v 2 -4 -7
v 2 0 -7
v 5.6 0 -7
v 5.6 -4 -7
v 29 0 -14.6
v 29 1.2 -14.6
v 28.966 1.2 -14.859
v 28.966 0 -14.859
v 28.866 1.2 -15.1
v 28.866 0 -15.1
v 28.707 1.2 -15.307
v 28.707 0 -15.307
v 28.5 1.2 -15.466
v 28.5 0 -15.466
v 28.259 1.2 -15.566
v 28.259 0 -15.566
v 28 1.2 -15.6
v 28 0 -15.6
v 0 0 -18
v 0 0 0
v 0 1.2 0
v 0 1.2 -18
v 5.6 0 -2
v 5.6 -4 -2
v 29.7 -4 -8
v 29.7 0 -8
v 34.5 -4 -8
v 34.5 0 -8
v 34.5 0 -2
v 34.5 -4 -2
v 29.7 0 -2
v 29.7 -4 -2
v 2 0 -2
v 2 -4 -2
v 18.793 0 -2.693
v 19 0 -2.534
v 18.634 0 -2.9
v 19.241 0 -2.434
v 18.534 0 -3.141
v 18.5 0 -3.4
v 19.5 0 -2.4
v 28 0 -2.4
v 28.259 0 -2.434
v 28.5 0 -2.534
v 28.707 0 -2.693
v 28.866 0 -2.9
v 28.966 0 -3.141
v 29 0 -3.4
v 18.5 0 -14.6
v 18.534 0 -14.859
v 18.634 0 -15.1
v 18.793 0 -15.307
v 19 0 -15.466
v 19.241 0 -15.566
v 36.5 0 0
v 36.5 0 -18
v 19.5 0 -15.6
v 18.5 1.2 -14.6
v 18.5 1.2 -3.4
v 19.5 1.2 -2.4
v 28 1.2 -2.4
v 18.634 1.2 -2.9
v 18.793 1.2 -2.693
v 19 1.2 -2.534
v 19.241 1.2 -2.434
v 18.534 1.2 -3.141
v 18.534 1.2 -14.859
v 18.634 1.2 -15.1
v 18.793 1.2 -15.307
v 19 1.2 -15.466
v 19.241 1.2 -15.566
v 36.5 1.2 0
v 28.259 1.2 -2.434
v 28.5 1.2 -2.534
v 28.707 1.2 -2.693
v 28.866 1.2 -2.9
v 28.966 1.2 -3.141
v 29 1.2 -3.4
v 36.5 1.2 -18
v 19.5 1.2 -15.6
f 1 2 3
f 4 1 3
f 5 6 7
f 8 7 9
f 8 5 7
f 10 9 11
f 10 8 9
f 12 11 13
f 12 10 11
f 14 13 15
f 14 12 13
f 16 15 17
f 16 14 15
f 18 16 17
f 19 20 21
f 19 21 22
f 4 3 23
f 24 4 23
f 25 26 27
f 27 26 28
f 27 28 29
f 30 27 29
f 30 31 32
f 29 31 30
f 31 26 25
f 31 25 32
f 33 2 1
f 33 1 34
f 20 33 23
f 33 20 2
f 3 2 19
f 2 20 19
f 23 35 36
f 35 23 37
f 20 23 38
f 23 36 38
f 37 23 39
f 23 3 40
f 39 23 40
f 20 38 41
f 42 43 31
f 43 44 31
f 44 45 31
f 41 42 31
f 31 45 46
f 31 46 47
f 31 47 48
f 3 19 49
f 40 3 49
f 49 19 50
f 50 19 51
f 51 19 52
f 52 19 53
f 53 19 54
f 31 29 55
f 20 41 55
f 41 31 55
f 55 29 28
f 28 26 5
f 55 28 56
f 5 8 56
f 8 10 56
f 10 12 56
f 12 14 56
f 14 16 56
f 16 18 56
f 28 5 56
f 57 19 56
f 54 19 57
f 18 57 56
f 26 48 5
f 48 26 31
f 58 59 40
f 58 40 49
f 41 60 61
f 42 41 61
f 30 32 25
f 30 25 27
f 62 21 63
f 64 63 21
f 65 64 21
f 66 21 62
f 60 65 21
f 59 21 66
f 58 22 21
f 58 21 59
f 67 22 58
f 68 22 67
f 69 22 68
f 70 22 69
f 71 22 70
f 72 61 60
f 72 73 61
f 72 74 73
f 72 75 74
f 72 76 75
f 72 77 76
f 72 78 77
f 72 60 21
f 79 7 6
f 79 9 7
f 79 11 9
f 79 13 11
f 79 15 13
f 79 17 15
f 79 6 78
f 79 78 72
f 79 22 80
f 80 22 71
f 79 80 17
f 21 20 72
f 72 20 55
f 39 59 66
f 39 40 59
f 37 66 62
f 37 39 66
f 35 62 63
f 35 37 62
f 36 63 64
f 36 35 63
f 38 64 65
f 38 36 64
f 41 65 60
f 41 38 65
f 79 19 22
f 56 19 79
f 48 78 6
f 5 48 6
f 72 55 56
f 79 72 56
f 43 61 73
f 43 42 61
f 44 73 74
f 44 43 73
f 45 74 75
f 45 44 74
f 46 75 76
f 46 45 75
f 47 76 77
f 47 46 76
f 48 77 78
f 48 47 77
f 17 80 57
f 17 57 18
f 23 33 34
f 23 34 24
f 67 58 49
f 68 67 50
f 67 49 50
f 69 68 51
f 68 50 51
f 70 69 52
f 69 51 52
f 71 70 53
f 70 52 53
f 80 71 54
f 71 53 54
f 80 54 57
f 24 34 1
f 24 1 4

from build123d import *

# Parameters (mm, degrees)
SKETCH1_W           = 36.5
SKETCH1_H           = 18
BOSS_EXTRUDE1_DEPTH = 1.2
SKETCH2_W           = 3.6
SKETCH2_H           = 5
SKETCH2_W_2         = 4.8
SKETCH2_H_2         = 6
BOSS_EXTRUDE2_DEPTH = 4
CUT_EXTRUDE1_REACH  = 7.2
SKETCH3_W           = 10.5
SKETCH3_H           = 13.2
FILLET1_R           = 1


with BuildPart() as part:
    # Sketch1 → Boss-Extrude1 (new body)
    with BuildSketch(Plane(origin=(0, 0, 0), x_dir=(1, 0, 0), z_dir=(0, 1, 0))):
        with Locations((18.25, 9)):
            Rectangle(SKETCH1_W, SKETCH1_H)
    extrude(amount=BOSS_EXTRUDE1_DEPTH)

    # Sketch2 → Boss-Extrude2 (add)
    with BuildSketch(Plane.XZ):
        with Locations((3.8, -4.5)):
            Rectangle(SKETCH2_W, SKETCH2_H)
        with Locations((32.1, -5)):
            Rectangle(SKETCH2_W_2, SKETCH2_H_2)
    extrude(amount=BOSS_EXTRUDE2_DEPTH)

    # Sketch3 → Cut-Extrude1 (cut, up to next)
    with BuildSketch(Plane(origin=(0, 1.2, 0), x_dir=(1, 0, 0), z_dir=(0, 1, 0)), mode=Mode.PRIVATE) as cut_extrude1_sk1:
        with Locations((23.75, 9)):
            Rectangle(SKETCH3_W, SKETCH3_H)
    cut_extrude1_tool1 = extrude(cut_extrude1_sk1.sketch, amount=-CUT_EXTRUDE1_REACH, mode=Mode.PRIVATE) & part.part
    add(cut_extrude1_tool1.solids().sort_by_distance((23.75, 1.2, -9))[0], mode=Mode.SUBTRACT)

    # Fillet1
    fillet1_edges = [part.edges().sort_by_distance(p)[0] for p in [
        (18.5, 0.6, -2.4),
        (18.5, 0.6, -15.6),
        (29, 0.6, -15.6),
        (29, 0.6, -2.4),
    ]]
    fillet(fillet1_edges, radius=FILLET1_R)


solid = part.part
